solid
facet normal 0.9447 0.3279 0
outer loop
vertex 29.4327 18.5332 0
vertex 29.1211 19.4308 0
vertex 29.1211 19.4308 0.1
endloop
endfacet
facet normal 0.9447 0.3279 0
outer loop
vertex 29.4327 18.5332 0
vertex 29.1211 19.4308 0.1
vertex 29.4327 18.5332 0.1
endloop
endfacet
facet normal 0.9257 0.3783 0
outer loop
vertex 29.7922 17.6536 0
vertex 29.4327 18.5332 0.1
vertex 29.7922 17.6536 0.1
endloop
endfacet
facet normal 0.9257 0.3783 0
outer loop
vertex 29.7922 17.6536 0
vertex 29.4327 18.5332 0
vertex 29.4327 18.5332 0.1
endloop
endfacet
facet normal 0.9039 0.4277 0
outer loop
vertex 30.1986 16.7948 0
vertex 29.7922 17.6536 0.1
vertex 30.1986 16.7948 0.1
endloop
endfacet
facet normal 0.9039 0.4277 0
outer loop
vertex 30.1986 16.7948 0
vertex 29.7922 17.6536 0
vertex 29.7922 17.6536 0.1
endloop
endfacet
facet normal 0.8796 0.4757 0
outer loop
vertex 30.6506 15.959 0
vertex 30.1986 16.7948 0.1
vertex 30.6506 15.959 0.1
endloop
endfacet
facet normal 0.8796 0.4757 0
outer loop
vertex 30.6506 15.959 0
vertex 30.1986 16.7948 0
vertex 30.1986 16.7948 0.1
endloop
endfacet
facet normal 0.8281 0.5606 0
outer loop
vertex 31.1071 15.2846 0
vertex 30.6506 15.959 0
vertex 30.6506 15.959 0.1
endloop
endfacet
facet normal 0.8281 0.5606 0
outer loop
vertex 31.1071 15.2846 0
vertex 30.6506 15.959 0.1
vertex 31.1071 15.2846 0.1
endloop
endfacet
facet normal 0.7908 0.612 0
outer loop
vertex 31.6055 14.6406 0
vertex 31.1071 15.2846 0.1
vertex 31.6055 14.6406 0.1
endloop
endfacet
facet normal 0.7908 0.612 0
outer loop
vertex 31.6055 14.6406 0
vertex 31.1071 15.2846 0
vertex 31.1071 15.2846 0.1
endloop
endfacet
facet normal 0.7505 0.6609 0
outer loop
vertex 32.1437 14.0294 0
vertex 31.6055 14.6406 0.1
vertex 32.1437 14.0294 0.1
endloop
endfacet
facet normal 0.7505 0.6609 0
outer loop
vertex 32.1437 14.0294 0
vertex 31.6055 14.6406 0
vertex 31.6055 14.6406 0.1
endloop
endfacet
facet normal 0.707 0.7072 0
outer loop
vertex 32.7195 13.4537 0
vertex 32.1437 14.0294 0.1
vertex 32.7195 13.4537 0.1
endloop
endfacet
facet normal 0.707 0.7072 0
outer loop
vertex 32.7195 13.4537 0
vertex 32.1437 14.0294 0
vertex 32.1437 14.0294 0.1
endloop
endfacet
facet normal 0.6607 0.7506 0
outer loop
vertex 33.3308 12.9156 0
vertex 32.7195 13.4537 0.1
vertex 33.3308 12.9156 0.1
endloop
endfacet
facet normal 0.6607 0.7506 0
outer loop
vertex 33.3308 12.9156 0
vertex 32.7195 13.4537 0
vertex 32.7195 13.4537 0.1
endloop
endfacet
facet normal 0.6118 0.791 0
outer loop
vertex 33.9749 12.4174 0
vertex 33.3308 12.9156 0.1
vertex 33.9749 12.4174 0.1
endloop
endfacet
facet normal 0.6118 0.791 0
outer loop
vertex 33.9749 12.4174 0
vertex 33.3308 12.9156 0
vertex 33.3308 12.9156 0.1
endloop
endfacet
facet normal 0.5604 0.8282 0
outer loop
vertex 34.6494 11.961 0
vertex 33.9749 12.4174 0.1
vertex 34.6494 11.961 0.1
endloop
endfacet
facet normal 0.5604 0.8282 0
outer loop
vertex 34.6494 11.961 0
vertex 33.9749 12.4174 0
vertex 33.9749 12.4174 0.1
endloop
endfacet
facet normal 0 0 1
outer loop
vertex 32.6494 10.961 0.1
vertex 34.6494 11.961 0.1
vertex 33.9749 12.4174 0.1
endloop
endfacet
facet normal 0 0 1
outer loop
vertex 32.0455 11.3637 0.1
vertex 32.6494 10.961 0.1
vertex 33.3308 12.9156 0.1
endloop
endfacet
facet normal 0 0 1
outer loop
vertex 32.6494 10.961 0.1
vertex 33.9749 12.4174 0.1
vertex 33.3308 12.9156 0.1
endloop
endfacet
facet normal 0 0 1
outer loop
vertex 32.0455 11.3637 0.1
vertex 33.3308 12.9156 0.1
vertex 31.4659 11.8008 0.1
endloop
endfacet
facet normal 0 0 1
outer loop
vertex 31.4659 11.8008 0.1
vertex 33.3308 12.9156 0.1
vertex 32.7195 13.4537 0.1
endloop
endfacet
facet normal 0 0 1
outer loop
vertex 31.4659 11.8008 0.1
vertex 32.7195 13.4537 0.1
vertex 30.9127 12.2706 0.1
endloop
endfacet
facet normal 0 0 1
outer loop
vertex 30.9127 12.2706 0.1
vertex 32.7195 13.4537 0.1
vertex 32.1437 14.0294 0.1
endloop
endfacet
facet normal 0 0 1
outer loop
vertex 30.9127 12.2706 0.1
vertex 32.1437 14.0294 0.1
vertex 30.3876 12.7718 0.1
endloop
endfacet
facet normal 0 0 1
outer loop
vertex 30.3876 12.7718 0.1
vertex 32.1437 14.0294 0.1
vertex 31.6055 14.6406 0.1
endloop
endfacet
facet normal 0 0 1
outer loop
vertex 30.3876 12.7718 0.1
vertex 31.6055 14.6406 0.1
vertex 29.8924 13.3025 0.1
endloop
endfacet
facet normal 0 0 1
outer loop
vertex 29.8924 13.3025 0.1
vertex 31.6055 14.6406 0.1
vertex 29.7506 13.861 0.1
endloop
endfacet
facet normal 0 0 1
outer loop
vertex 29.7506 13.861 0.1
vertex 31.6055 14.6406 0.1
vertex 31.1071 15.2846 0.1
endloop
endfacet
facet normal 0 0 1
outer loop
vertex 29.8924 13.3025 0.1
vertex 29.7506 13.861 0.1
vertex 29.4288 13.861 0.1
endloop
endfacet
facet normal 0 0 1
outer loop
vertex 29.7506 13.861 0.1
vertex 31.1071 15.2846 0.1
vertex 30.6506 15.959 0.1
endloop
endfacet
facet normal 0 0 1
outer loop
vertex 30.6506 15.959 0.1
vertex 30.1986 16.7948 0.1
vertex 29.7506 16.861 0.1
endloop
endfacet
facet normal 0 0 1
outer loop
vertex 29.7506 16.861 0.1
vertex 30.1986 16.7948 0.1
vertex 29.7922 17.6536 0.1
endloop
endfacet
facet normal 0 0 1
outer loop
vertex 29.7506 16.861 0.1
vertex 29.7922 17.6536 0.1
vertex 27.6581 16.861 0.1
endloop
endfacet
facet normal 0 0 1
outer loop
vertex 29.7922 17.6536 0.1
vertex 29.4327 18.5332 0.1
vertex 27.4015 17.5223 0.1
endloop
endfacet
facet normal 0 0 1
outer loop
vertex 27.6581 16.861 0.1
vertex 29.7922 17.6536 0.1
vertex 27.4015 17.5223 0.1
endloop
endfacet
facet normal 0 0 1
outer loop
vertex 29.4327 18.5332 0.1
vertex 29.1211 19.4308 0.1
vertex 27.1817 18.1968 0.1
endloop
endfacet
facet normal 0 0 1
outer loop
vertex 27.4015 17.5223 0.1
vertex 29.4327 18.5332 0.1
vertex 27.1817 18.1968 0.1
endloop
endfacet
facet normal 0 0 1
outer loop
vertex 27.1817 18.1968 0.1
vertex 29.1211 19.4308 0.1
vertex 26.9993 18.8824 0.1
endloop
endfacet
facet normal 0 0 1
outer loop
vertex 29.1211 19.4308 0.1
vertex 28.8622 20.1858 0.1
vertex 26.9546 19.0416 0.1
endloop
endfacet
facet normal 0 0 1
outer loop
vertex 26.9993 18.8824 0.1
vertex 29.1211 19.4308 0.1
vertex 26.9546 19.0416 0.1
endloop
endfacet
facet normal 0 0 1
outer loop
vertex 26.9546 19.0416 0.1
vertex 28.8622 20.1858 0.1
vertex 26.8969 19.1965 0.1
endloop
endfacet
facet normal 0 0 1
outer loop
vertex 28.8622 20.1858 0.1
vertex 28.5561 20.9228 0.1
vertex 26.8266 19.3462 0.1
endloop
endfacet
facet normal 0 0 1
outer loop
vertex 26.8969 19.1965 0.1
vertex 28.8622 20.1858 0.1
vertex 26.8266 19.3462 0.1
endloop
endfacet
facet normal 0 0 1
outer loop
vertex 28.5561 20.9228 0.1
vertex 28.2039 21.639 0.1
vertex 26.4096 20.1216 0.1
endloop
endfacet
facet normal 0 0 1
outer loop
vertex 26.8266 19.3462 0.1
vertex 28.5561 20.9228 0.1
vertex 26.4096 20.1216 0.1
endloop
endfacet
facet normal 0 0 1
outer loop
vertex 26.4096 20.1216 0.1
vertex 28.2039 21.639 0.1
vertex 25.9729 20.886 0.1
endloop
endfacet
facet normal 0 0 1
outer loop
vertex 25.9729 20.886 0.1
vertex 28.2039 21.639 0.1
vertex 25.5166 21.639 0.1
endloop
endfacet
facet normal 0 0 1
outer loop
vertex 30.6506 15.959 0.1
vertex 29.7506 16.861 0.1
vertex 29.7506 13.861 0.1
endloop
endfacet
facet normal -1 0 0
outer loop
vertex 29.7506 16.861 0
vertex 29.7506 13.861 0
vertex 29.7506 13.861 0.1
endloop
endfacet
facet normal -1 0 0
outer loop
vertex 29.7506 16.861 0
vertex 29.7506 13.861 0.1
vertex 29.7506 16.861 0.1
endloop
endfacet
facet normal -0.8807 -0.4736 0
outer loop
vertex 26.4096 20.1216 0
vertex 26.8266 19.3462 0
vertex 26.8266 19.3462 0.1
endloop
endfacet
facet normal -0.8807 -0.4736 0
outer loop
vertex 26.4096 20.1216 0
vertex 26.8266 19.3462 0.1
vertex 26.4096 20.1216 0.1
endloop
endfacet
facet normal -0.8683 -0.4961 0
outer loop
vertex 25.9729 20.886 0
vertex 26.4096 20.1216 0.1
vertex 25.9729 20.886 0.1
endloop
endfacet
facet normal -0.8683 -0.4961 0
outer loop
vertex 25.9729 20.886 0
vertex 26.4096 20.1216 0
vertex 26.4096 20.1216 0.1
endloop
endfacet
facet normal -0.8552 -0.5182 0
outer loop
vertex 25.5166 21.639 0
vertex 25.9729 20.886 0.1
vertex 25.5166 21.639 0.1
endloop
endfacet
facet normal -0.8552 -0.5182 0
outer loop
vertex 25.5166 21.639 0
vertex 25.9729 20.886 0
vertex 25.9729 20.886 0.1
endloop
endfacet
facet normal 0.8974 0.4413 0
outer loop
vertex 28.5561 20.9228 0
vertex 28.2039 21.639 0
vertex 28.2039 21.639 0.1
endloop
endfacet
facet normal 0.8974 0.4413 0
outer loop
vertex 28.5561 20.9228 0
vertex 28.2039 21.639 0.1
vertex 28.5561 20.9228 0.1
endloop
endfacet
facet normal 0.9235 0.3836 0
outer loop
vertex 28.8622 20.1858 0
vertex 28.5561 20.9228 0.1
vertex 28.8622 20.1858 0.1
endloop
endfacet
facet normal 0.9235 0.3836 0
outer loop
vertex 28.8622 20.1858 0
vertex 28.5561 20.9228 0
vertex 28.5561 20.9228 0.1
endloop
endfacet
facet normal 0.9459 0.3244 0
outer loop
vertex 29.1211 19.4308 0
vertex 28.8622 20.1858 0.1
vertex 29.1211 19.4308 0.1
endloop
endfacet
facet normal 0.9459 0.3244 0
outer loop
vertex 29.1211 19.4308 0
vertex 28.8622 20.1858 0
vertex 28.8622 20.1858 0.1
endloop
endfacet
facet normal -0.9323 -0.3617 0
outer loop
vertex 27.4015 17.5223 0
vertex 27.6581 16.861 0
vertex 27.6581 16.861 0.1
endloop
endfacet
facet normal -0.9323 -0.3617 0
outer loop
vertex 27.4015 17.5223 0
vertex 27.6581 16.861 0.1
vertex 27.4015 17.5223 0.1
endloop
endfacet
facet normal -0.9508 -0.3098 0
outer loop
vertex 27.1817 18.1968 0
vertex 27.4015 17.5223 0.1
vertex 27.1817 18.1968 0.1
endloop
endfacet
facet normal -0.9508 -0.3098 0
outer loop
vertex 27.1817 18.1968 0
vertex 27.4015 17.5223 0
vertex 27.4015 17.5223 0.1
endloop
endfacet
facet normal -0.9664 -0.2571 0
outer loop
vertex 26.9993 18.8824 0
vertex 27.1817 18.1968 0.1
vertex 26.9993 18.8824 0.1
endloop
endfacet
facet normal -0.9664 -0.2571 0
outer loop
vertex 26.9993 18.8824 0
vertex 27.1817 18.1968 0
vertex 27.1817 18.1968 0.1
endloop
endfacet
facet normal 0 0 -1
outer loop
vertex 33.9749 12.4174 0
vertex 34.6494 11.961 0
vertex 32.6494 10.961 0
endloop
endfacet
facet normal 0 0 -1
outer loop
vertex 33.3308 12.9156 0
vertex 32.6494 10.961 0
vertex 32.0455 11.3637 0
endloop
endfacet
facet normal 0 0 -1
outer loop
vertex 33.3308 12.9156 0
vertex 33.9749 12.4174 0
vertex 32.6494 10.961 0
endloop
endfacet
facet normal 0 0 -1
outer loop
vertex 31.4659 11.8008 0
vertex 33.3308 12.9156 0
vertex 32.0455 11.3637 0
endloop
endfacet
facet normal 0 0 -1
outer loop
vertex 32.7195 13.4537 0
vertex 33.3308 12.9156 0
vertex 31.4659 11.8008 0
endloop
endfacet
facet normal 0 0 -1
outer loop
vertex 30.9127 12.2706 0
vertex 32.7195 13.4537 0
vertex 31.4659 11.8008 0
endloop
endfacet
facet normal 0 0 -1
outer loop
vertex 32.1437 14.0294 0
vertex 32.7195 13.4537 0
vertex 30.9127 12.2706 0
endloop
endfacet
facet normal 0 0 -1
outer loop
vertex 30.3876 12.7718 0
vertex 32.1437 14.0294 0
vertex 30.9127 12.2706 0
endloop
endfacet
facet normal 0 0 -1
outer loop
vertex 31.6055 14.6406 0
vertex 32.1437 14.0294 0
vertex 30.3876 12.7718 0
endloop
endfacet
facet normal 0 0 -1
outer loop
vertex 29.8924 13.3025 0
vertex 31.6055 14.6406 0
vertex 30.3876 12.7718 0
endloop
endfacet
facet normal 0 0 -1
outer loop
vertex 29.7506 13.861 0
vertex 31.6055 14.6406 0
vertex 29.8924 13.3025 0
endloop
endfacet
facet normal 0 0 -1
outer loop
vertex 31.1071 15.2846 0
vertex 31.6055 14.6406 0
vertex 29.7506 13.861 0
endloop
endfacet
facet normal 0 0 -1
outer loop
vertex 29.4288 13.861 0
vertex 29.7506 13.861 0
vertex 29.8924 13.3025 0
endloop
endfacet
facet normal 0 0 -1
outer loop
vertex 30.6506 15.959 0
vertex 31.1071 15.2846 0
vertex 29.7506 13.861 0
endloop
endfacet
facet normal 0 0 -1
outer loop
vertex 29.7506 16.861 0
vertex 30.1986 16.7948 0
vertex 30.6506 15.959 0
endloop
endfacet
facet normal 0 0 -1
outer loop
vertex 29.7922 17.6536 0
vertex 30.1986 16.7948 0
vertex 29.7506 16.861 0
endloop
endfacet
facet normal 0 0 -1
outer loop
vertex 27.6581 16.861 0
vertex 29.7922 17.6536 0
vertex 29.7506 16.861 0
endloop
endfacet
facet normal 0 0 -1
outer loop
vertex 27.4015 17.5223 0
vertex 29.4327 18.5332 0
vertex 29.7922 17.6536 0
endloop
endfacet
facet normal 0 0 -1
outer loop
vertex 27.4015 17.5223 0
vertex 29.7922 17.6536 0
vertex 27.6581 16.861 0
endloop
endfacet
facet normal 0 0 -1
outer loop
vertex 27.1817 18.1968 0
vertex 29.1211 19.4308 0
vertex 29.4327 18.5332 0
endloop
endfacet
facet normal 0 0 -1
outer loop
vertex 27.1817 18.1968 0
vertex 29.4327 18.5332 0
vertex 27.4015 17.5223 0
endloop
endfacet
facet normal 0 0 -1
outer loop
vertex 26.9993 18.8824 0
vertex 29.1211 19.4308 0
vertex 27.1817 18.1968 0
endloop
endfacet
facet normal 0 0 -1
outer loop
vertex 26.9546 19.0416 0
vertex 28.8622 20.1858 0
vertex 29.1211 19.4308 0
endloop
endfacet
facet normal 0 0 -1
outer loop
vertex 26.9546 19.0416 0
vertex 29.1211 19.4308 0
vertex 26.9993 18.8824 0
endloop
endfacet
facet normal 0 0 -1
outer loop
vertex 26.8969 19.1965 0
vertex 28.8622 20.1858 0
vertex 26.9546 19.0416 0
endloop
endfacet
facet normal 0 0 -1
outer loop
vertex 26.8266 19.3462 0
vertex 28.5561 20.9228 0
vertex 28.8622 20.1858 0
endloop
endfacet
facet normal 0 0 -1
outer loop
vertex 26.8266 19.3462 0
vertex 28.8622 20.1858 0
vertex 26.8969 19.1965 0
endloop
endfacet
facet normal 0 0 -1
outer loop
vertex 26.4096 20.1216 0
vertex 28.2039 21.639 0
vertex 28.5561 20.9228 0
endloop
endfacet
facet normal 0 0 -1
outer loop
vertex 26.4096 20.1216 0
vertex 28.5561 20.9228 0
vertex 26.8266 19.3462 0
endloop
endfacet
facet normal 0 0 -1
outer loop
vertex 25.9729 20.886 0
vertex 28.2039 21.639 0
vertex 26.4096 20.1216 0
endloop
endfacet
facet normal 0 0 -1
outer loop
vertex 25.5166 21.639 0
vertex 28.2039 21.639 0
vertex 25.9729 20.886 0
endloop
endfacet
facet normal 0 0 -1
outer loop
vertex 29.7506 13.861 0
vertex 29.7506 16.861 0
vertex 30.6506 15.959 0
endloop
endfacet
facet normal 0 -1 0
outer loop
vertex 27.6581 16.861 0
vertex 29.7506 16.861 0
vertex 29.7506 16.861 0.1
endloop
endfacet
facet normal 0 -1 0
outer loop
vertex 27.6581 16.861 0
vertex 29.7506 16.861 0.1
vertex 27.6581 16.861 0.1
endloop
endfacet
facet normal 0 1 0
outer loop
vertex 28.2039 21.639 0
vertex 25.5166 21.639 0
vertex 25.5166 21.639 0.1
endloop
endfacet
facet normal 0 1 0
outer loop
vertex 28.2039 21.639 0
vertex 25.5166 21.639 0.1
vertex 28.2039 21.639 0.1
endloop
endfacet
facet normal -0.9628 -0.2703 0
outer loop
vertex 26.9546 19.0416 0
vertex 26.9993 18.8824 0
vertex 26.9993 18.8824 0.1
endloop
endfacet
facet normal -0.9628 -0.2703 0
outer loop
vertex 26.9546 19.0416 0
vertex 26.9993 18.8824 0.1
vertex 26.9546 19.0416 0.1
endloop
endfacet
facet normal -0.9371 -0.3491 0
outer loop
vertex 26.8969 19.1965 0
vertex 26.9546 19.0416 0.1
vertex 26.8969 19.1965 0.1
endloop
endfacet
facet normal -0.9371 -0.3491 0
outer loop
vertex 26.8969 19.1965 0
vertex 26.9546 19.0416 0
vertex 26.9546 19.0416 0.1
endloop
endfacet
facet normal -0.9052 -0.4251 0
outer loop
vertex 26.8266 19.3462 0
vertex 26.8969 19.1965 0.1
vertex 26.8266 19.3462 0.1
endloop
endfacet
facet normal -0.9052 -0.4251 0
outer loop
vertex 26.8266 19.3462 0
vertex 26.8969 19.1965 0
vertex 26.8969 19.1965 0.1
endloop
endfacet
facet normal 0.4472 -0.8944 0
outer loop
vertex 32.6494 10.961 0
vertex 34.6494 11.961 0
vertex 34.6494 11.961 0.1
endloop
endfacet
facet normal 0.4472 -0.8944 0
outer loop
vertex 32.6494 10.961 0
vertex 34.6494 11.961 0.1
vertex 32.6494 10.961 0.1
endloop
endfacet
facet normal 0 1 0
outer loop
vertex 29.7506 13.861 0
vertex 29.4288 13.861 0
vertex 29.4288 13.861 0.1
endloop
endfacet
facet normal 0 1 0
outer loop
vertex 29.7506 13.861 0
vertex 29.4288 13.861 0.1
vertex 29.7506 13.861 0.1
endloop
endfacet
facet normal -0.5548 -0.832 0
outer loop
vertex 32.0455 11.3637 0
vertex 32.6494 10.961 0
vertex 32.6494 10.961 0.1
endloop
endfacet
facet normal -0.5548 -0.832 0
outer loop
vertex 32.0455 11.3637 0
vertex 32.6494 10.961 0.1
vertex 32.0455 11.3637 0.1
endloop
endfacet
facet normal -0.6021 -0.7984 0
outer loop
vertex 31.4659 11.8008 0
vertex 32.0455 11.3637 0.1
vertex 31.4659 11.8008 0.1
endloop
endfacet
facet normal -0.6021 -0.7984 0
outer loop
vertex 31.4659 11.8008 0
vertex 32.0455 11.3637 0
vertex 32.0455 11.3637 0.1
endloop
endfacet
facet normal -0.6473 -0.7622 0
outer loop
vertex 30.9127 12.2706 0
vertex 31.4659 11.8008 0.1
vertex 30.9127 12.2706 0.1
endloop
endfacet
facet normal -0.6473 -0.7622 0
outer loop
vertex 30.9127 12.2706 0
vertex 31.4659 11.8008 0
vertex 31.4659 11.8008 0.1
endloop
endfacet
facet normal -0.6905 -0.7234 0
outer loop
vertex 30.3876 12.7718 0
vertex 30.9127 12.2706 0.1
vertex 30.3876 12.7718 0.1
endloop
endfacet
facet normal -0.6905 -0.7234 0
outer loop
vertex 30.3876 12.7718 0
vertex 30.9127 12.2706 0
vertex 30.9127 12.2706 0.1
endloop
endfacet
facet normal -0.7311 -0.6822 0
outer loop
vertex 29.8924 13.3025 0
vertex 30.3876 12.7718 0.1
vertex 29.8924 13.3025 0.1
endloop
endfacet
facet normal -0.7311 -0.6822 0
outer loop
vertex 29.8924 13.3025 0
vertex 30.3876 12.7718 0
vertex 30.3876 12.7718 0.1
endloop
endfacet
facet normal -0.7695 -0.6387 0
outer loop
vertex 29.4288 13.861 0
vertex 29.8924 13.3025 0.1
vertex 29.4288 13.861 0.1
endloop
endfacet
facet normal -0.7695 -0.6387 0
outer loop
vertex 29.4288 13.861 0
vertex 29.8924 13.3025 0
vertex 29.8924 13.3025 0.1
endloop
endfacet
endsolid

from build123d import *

# Parameters (mm, degrees)
SALIENTE_EXTRUIR1_DEPTH = 0.1


with BuildPart() as part:
    # Model → Saliente-Extruir1 (new body)
    with BuildSketch(Plane.XY):
        with BuildLine():
            Line((34.649371272, 11.960982991), (32.649371272, 10.960982991))
            ThreePointArc((32.649371272, 10.960982991), (30.912697203, 12.270631548), (29.428783982, 13.860982991))
            Line((29.428783982, 13.860982991), (29.750628728, 13.860982991))
            Line((29.750628728, 13.860982991), (29.750628728, 16.860982991))
            Line((29.750628728, 16.860982991), (27.658106466, 16.860982991))
            ThreePointArc((27.658106466, 16.860982991), (27.286967067, 17.858065763), (26.999339741, 18.882365051))
            ThreePointArc((26.999339741, 18.882365051), (26.927371, 19.119642667), (26.826595189, 19.346191565))
            ThreePointArc((26.826595189, 19.346191565), (26.1936862, 20.505212953), (25.516639133, 21.639017009))
            Line((25.516639133, 21.639017009), (28.203922027, 21.639017009))
            ThreePointArc((28.203922027, 21.639017009), (28.714965722, 20.556705993), (29.121100427, 19.430820834))
            ThreePointArc((29.121100427, 19.430820834), (29.792213257, 17.653647808), (30.650628728, 15.958991716))
            ThreePointArc((30.650628728, 15.958991716), (32.427042415, 13.736988846), (34.649371272, 11.960982991))
        make_face()
    extrude(amount=SALIENTE_EXTRUIR1_DEPTH)


solid = part.part
